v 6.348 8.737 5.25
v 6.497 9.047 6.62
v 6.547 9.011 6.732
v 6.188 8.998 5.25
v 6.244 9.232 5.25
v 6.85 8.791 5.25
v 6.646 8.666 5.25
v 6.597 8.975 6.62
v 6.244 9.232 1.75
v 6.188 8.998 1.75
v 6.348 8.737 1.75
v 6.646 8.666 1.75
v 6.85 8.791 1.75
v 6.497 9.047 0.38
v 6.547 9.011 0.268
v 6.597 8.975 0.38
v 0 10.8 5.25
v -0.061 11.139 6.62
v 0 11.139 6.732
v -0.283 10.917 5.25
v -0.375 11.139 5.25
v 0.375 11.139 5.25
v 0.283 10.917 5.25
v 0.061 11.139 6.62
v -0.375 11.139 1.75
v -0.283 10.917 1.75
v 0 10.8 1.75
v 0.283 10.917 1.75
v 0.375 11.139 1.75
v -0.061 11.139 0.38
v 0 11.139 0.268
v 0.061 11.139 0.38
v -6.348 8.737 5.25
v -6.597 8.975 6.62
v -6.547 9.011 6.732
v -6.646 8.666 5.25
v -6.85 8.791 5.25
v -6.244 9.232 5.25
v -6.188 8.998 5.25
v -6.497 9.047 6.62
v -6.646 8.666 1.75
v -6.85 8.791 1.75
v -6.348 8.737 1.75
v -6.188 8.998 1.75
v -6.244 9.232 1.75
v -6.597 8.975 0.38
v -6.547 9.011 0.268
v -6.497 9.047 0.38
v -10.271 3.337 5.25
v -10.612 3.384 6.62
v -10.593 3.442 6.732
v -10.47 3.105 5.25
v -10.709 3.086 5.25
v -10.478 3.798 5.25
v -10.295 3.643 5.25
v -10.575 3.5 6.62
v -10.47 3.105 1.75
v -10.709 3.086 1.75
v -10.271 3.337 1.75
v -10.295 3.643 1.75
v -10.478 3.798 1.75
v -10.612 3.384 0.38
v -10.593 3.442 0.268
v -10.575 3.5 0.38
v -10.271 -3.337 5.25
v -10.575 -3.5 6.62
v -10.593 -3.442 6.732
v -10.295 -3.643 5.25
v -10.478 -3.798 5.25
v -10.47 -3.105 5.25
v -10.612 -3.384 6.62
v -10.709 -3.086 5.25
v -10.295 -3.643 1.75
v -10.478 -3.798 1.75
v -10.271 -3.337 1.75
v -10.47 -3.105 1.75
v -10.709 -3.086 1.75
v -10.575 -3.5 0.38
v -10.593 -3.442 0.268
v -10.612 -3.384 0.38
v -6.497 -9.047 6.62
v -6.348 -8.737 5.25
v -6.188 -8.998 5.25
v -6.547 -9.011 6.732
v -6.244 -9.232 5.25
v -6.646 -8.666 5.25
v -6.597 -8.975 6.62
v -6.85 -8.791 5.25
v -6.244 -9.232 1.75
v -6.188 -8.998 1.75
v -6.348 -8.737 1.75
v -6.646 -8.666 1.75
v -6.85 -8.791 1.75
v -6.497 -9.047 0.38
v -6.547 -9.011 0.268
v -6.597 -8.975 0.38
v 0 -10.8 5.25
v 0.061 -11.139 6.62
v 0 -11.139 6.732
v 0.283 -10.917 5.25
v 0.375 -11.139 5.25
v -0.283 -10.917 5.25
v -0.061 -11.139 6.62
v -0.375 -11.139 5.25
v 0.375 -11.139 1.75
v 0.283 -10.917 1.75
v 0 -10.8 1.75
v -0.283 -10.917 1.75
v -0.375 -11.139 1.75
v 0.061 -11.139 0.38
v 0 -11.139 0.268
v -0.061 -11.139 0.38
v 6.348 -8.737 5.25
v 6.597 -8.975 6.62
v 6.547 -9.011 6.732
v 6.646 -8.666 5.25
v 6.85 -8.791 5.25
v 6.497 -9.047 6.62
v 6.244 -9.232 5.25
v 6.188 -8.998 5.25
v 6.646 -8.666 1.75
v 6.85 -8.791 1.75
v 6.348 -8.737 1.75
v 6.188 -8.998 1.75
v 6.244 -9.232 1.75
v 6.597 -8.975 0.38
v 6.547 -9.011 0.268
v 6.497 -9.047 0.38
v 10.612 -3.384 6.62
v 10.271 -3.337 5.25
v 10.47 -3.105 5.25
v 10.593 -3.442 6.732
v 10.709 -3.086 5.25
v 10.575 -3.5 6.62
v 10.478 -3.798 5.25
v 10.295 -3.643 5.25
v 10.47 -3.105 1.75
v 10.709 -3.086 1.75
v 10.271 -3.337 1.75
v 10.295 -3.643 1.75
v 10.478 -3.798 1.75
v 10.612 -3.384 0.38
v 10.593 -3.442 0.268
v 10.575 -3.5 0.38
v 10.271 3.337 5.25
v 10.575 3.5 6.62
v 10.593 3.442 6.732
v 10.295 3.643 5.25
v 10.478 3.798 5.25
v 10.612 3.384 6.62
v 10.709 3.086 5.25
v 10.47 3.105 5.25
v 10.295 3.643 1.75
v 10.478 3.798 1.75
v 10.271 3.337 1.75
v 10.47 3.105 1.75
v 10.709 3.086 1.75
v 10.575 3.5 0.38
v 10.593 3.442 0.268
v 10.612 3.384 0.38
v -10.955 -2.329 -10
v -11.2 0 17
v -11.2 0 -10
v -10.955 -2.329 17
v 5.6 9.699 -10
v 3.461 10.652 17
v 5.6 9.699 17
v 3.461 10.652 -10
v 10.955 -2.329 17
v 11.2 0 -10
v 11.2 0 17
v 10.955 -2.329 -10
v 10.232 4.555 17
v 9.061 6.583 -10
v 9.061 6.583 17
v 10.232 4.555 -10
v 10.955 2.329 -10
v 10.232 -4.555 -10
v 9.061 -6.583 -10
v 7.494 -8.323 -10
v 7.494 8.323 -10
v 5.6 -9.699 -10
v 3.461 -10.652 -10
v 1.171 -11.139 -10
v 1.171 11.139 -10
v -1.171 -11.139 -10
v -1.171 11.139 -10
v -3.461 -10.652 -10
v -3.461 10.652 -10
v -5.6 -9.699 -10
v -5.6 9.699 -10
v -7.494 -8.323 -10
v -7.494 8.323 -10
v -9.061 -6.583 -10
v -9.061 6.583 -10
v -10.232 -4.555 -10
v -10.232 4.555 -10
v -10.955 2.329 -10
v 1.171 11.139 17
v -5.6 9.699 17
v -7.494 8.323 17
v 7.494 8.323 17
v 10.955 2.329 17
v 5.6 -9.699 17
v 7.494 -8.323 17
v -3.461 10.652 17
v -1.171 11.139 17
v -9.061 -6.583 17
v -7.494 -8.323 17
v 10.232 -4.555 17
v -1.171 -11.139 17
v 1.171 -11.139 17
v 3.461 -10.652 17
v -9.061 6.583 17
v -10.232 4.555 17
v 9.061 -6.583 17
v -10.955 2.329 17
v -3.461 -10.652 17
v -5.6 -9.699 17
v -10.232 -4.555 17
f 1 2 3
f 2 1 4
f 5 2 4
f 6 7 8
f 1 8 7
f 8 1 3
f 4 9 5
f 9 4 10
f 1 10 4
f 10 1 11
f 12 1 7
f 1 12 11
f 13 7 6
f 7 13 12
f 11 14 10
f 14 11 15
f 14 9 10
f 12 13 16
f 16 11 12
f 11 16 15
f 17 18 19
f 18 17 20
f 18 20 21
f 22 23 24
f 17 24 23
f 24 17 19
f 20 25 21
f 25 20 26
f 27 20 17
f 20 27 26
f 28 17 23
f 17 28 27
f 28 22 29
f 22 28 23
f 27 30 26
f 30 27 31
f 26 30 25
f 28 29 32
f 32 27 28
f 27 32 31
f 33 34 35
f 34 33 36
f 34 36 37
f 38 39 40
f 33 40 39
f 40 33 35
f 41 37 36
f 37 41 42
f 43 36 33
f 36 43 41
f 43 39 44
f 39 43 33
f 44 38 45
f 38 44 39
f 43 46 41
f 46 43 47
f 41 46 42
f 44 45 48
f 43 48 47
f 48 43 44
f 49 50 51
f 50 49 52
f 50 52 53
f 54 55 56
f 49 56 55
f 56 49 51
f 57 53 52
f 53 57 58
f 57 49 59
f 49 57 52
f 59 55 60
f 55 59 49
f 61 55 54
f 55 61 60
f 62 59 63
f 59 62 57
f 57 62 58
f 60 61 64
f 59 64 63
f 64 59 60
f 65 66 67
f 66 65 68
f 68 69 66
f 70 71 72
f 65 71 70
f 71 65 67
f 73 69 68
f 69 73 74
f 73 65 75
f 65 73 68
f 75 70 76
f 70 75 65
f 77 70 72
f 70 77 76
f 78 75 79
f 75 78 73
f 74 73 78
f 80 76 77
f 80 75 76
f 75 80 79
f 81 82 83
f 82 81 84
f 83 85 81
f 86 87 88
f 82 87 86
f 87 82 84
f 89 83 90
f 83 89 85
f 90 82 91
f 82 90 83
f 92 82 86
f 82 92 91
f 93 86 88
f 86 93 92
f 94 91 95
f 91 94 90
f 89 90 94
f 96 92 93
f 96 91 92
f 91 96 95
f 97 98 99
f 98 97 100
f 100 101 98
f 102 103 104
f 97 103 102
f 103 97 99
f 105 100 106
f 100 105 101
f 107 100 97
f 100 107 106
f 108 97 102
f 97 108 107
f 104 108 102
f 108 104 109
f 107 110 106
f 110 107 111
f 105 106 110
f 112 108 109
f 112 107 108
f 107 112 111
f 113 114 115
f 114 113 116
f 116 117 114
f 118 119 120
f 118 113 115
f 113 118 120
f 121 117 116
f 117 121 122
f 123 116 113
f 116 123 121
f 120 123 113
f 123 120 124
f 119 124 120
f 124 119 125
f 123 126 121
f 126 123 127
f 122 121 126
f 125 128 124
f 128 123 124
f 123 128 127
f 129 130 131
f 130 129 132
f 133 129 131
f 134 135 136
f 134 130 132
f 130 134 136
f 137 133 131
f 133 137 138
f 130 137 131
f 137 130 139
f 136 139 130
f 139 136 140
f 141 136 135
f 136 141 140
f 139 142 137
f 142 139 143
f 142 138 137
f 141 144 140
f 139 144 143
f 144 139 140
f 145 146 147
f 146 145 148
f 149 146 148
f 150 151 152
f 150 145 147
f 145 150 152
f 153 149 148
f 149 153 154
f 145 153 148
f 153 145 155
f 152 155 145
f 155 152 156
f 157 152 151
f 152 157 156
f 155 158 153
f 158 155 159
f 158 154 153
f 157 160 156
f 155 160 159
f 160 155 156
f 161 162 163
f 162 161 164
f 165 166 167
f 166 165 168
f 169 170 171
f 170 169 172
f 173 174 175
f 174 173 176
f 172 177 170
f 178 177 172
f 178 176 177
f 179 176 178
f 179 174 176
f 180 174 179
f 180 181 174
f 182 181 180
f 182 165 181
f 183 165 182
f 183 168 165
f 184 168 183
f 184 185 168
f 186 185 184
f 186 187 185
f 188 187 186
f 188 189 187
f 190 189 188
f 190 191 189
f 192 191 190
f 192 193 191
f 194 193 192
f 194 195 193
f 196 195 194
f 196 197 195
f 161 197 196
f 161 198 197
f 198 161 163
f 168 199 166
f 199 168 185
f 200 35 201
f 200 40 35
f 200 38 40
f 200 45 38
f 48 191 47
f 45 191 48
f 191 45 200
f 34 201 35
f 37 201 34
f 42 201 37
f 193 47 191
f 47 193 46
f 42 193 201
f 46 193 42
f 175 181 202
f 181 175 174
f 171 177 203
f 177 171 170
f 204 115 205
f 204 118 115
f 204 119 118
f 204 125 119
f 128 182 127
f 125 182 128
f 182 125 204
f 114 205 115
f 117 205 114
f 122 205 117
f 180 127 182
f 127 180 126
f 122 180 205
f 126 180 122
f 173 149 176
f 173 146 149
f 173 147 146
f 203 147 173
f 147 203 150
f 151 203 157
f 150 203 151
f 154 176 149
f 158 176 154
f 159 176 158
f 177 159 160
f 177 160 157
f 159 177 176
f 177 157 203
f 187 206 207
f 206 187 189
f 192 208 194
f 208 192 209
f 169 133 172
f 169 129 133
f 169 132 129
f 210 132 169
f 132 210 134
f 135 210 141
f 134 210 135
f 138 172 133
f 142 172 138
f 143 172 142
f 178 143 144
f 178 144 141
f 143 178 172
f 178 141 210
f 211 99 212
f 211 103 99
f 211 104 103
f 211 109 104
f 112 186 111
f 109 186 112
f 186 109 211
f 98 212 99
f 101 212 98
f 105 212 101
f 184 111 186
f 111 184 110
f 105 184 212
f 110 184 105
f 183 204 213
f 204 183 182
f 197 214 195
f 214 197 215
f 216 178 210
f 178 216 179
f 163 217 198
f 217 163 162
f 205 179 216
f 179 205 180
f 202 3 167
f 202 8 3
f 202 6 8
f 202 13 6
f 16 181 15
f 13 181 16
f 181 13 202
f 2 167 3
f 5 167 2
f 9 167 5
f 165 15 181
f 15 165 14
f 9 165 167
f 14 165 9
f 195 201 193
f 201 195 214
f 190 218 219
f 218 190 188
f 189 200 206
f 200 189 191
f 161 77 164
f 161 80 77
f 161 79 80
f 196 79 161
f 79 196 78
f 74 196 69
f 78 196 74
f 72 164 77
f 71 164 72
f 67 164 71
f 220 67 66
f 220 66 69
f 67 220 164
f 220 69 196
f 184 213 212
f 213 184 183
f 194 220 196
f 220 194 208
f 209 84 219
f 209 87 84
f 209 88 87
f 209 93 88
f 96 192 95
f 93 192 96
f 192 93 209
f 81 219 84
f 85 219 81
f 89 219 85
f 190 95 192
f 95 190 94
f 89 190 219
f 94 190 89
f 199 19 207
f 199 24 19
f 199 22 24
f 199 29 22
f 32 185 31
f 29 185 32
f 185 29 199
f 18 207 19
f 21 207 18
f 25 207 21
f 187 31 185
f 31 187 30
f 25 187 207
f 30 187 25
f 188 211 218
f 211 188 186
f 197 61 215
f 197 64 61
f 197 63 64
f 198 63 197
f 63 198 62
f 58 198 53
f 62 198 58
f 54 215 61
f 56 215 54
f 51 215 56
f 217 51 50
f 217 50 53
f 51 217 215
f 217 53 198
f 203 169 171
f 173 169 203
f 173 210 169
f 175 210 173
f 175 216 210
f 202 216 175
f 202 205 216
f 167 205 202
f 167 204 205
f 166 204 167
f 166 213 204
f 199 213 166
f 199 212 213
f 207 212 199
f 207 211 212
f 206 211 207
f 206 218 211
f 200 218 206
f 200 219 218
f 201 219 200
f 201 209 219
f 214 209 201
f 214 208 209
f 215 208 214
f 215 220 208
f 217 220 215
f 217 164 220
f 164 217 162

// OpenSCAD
// file: bearing.table.scad
function bearing_outer_diameter(index) = bearing_data(index)[0];
function bearing_inner_diameter(index) = bearing_data(index)[1];
function bearing_height(index) = bearing_data(index)[2];
function bearing_ball_qty(index) = bearing_data(index)[3];

function bearing_data(index) = 
    // od, id, h, ball_qty
    index == "608"  ? [22, 8, 7, 7] :
    "Error";
// file: bearing_race_hole.settings.scad
default_clearance = 0.2;
default_spline_qty = 10;
default_spline_depth = 0.4;
default_extra_margin_top = 10;
default_extra_margin_bottom = 10;
// file: bearing_race_spline.scad
bearing_race_spline();

module bearing_race_spline(
    h = 10, 
    r = 1,
    taper = 2.5)
{
    cylinder_height = h - (taper * 2);
    
    translate([0,0,taper + cylinder_height])
    cylinder(h = taper, r1 = r, r2 = 0);
    
    translate([0,0,taper])
    cylinder(h = cylinder_height, r = r);
    
    cylinder(h = taper, r1 = 0, r2 = r);
}
// main file
use <bearing_race_spline.scad>;
include <bearing_race_hole.settings.scad>;
include <bearing.table.scad>;

bearing_race_hole();

module bearing_race_hole(
    index = "608",
    clearance = undef,
    h = undef,
    spline_qty = undef,
    spline_depth = undef,
    extra_margin_bottom = undef,
    extra_margin_top = undef)
{
    function _clearance() = (clearance != undef) ? clearance : default_clearance;
    function _h() = (h != undef) ? h : bearing_height(index);
    function _spline_qty() = (spline_qty != undef) ? spline_qty : default_spline_qty;
    function _spline_depth() = (spline_depth != undef) ? spline_depth : default_spline_depth;
    function _extra_margin_bottom() = (extra_margin_bottom != undef) ? extra_margin_bottom : default_extra_margin_bottom;
    function _extra_margin_top() = (extra_margin_top != undef) ? extra_margin_top : default_extra_margin_top;

    r = (bearing_outer_diameter(index) / 2) + _clearance();

    difference()
    {
        extra_margin_bottom = _extra_margin_bottom();
        extra_margin_top = _extra_margin_top();
        spline_qty = _spline_qty();
        h = _h() + extra_margin_bottom + extra_margin_top;

        translate([0, 0, -extra_margin_bottom])
        cylinder(h = h, r = r);
        
        rotate([0, 0, 360 / spline_qty / 2])
        splines();
    }
    
    module splines()
    {
        h = _h();
        spline_qty = _spline_qty();
        spline_depth = _spline_depth();

        for (i = [1:spline_qty])
        {
            angle = i * (360 / spline_qty);
            rotate([0, 0, angle])
            translate([r, 0, 0])
            bearing_race_spline(
                h = h, 
                r = spline_depth, 
                taper = h / 4, 
                $fn = 8);
        }        
    }
}
